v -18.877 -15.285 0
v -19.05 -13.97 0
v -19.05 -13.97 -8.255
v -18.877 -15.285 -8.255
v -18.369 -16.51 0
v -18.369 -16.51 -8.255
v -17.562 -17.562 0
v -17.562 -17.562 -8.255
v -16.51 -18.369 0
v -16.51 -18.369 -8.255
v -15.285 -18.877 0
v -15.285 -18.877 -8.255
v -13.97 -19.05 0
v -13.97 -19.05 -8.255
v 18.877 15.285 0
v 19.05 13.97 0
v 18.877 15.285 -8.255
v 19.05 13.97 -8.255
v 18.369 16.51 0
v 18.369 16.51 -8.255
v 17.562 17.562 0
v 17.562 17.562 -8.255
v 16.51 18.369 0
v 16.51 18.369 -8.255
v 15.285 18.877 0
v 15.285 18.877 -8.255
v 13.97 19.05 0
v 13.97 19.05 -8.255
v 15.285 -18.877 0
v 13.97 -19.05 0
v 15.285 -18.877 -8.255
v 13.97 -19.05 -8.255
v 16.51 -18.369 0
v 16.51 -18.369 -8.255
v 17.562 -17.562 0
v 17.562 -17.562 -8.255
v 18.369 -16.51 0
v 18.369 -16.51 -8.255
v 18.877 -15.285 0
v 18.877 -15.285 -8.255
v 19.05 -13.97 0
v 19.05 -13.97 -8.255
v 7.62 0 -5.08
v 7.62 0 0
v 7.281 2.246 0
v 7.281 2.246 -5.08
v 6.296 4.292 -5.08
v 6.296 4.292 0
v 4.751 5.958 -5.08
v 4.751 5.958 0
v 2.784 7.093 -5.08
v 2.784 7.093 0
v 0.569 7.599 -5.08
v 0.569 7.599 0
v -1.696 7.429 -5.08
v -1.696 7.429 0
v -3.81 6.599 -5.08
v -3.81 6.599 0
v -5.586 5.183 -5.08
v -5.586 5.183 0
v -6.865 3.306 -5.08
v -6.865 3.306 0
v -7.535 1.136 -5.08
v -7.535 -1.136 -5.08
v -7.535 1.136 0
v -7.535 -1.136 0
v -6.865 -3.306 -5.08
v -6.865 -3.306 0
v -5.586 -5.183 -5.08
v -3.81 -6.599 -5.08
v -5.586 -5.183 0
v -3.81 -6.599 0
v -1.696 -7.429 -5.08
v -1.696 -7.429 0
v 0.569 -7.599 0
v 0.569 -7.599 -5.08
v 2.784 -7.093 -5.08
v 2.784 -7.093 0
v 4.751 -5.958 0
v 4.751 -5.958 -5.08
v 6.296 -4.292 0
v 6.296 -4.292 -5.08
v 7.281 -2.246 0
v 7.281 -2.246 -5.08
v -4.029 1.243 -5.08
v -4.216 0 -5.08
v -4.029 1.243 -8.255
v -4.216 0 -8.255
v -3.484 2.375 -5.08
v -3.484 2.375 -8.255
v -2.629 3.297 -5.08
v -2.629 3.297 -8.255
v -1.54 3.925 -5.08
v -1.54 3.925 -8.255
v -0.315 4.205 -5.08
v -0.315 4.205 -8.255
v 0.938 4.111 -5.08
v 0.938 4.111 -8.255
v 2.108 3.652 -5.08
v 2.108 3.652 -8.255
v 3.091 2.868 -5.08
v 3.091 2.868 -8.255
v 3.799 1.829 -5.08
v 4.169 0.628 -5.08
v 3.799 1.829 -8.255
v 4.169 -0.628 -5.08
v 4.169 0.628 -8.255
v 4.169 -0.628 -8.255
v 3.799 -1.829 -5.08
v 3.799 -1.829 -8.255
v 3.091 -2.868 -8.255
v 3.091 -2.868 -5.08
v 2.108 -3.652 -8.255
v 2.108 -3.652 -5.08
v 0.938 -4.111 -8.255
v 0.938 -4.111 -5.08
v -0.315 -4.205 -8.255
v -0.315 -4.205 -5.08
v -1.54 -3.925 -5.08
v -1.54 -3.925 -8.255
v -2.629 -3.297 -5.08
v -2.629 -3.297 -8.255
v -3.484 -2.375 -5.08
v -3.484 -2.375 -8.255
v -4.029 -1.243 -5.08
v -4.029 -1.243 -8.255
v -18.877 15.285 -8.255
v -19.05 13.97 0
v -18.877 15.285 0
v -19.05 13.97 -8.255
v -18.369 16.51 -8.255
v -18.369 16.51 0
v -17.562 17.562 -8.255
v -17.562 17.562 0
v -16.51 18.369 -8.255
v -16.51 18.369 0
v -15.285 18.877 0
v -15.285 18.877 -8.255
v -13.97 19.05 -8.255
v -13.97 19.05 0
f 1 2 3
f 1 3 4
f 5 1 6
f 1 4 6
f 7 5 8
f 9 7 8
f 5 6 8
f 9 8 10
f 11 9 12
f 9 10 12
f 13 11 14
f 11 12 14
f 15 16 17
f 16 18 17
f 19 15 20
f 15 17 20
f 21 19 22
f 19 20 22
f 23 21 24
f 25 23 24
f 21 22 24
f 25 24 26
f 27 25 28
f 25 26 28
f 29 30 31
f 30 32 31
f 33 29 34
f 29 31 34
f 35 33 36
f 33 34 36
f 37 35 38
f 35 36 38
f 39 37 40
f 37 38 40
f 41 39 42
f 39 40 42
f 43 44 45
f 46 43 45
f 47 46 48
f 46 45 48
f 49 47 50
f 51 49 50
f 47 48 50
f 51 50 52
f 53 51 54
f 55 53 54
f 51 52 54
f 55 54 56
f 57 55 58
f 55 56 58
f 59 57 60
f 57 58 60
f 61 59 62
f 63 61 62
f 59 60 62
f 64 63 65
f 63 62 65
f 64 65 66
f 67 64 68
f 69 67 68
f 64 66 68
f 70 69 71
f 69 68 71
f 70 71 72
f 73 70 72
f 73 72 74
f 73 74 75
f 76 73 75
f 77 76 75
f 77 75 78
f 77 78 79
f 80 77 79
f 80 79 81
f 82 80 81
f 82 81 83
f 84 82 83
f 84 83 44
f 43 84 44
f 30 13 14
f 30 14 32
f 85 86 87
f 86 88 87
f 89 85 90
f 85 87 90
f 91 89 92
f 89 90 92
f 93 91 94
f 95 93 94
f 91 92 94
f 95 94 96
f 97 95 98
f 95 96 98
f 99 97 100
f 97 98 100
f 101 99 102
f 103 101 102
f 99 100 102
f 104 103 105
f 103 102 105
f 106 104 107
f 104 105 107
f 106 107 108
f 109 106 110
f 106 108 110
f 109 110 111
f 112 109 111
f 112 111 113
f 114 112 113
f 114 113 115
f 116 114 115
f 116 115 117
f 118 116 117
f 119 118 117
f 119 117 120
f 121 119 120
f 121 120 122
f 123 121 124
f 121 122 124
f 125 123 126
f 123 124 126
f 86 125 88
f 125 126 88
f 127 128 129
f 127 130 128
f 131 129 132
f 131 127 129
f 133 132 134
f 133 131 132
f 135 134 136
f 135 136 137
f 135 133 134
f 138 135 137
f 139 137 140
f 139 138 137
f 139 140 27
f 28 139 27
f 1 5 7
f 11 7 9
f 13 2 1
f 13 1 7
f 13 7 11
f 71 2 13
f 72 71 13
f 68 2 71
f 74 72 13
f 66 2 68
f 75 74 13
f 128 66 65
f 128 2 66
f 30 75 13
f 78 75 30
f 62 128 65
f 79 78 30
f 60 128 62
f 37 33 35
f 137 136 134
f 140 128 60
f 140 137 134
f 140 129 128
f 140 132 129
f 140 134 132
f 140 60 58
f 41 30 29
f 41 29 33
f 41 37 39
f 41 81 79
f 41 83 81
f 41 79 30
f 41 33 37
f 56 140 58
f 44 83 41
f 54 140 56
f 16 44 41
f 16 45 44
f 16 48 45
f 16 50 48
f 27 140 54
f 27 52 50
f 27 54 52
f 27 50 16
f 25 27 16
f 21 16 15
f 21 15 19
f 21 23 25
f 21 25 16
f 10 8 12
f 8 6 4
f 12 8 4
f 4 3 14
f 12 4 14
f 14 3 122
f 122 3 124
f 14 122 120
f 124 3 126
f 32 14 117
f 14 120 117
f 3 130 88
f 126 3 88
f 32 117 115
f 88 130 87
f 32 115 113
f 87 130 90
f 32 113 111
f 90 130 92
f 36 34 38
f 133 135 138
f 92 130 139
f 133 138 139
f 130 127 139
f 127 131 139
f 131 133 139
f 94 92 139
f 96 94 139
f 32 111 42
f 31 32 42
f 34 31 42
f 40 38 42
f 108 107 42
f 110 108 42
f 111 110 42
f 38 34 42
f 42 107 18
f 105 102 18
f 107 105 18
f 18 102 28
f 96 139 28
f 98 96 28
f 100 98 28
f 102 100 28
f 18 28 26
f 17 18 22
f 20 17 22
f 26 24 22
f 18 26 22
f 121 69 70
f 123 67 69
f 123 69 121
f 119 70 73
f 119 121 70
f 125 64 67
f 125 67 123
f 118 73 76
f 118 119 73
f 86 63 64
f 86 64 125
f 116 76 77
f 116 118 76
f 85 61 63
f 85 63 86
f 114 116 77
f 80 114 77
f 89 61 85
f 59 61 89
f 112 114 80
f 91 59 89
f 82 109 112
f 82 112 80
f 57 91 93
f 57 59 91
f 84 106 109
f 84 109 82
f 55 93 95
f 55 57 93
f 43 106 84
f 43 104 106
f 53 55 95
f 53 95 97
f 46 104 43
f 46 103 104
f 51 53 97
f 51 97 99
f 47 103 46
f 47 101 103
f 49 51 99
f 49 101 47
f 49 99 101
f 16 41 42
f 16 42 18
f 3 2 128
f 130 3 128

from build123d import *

# Parameters (mm, degrees)
F0_W           = 38.1
F0_H           = 38.1
F1_DEPTH       = 8.255
F2_R           = 5.08
F3_D           = 8.4328
F3_CBORE_D     = 15.24
F3_CBORE_DEPTH = 5.08


with BuildPart() as f1:
    # F0 (on Top) → F1 (new body)
    with BuildSketch(Plane.XY):
        Rectangle(F0_W, F0_H)
    extrude(amount=-F1_DEPTH)

    # F2
    f2_edges = [f1.edges().sort_by_distance(p)[0] for p in [
        (-19.05, 19.05, -4.1275),
        (-19.05, -19.05, -4.1275),
        (19.05, -19.05, -4.1275),
        (19.05, 19.05, -4.1275),
    ]]
    fillet(f2_edges, radius=F2_R)

    # F3 (through all)
    with Locations(Plane.XY):
        with Locations((0, 0)):
            CounterBoreHole(F3_D / 2, F3_CBORE_D / 2, F3_CBORE_DEPTH)


solid = f1.part
